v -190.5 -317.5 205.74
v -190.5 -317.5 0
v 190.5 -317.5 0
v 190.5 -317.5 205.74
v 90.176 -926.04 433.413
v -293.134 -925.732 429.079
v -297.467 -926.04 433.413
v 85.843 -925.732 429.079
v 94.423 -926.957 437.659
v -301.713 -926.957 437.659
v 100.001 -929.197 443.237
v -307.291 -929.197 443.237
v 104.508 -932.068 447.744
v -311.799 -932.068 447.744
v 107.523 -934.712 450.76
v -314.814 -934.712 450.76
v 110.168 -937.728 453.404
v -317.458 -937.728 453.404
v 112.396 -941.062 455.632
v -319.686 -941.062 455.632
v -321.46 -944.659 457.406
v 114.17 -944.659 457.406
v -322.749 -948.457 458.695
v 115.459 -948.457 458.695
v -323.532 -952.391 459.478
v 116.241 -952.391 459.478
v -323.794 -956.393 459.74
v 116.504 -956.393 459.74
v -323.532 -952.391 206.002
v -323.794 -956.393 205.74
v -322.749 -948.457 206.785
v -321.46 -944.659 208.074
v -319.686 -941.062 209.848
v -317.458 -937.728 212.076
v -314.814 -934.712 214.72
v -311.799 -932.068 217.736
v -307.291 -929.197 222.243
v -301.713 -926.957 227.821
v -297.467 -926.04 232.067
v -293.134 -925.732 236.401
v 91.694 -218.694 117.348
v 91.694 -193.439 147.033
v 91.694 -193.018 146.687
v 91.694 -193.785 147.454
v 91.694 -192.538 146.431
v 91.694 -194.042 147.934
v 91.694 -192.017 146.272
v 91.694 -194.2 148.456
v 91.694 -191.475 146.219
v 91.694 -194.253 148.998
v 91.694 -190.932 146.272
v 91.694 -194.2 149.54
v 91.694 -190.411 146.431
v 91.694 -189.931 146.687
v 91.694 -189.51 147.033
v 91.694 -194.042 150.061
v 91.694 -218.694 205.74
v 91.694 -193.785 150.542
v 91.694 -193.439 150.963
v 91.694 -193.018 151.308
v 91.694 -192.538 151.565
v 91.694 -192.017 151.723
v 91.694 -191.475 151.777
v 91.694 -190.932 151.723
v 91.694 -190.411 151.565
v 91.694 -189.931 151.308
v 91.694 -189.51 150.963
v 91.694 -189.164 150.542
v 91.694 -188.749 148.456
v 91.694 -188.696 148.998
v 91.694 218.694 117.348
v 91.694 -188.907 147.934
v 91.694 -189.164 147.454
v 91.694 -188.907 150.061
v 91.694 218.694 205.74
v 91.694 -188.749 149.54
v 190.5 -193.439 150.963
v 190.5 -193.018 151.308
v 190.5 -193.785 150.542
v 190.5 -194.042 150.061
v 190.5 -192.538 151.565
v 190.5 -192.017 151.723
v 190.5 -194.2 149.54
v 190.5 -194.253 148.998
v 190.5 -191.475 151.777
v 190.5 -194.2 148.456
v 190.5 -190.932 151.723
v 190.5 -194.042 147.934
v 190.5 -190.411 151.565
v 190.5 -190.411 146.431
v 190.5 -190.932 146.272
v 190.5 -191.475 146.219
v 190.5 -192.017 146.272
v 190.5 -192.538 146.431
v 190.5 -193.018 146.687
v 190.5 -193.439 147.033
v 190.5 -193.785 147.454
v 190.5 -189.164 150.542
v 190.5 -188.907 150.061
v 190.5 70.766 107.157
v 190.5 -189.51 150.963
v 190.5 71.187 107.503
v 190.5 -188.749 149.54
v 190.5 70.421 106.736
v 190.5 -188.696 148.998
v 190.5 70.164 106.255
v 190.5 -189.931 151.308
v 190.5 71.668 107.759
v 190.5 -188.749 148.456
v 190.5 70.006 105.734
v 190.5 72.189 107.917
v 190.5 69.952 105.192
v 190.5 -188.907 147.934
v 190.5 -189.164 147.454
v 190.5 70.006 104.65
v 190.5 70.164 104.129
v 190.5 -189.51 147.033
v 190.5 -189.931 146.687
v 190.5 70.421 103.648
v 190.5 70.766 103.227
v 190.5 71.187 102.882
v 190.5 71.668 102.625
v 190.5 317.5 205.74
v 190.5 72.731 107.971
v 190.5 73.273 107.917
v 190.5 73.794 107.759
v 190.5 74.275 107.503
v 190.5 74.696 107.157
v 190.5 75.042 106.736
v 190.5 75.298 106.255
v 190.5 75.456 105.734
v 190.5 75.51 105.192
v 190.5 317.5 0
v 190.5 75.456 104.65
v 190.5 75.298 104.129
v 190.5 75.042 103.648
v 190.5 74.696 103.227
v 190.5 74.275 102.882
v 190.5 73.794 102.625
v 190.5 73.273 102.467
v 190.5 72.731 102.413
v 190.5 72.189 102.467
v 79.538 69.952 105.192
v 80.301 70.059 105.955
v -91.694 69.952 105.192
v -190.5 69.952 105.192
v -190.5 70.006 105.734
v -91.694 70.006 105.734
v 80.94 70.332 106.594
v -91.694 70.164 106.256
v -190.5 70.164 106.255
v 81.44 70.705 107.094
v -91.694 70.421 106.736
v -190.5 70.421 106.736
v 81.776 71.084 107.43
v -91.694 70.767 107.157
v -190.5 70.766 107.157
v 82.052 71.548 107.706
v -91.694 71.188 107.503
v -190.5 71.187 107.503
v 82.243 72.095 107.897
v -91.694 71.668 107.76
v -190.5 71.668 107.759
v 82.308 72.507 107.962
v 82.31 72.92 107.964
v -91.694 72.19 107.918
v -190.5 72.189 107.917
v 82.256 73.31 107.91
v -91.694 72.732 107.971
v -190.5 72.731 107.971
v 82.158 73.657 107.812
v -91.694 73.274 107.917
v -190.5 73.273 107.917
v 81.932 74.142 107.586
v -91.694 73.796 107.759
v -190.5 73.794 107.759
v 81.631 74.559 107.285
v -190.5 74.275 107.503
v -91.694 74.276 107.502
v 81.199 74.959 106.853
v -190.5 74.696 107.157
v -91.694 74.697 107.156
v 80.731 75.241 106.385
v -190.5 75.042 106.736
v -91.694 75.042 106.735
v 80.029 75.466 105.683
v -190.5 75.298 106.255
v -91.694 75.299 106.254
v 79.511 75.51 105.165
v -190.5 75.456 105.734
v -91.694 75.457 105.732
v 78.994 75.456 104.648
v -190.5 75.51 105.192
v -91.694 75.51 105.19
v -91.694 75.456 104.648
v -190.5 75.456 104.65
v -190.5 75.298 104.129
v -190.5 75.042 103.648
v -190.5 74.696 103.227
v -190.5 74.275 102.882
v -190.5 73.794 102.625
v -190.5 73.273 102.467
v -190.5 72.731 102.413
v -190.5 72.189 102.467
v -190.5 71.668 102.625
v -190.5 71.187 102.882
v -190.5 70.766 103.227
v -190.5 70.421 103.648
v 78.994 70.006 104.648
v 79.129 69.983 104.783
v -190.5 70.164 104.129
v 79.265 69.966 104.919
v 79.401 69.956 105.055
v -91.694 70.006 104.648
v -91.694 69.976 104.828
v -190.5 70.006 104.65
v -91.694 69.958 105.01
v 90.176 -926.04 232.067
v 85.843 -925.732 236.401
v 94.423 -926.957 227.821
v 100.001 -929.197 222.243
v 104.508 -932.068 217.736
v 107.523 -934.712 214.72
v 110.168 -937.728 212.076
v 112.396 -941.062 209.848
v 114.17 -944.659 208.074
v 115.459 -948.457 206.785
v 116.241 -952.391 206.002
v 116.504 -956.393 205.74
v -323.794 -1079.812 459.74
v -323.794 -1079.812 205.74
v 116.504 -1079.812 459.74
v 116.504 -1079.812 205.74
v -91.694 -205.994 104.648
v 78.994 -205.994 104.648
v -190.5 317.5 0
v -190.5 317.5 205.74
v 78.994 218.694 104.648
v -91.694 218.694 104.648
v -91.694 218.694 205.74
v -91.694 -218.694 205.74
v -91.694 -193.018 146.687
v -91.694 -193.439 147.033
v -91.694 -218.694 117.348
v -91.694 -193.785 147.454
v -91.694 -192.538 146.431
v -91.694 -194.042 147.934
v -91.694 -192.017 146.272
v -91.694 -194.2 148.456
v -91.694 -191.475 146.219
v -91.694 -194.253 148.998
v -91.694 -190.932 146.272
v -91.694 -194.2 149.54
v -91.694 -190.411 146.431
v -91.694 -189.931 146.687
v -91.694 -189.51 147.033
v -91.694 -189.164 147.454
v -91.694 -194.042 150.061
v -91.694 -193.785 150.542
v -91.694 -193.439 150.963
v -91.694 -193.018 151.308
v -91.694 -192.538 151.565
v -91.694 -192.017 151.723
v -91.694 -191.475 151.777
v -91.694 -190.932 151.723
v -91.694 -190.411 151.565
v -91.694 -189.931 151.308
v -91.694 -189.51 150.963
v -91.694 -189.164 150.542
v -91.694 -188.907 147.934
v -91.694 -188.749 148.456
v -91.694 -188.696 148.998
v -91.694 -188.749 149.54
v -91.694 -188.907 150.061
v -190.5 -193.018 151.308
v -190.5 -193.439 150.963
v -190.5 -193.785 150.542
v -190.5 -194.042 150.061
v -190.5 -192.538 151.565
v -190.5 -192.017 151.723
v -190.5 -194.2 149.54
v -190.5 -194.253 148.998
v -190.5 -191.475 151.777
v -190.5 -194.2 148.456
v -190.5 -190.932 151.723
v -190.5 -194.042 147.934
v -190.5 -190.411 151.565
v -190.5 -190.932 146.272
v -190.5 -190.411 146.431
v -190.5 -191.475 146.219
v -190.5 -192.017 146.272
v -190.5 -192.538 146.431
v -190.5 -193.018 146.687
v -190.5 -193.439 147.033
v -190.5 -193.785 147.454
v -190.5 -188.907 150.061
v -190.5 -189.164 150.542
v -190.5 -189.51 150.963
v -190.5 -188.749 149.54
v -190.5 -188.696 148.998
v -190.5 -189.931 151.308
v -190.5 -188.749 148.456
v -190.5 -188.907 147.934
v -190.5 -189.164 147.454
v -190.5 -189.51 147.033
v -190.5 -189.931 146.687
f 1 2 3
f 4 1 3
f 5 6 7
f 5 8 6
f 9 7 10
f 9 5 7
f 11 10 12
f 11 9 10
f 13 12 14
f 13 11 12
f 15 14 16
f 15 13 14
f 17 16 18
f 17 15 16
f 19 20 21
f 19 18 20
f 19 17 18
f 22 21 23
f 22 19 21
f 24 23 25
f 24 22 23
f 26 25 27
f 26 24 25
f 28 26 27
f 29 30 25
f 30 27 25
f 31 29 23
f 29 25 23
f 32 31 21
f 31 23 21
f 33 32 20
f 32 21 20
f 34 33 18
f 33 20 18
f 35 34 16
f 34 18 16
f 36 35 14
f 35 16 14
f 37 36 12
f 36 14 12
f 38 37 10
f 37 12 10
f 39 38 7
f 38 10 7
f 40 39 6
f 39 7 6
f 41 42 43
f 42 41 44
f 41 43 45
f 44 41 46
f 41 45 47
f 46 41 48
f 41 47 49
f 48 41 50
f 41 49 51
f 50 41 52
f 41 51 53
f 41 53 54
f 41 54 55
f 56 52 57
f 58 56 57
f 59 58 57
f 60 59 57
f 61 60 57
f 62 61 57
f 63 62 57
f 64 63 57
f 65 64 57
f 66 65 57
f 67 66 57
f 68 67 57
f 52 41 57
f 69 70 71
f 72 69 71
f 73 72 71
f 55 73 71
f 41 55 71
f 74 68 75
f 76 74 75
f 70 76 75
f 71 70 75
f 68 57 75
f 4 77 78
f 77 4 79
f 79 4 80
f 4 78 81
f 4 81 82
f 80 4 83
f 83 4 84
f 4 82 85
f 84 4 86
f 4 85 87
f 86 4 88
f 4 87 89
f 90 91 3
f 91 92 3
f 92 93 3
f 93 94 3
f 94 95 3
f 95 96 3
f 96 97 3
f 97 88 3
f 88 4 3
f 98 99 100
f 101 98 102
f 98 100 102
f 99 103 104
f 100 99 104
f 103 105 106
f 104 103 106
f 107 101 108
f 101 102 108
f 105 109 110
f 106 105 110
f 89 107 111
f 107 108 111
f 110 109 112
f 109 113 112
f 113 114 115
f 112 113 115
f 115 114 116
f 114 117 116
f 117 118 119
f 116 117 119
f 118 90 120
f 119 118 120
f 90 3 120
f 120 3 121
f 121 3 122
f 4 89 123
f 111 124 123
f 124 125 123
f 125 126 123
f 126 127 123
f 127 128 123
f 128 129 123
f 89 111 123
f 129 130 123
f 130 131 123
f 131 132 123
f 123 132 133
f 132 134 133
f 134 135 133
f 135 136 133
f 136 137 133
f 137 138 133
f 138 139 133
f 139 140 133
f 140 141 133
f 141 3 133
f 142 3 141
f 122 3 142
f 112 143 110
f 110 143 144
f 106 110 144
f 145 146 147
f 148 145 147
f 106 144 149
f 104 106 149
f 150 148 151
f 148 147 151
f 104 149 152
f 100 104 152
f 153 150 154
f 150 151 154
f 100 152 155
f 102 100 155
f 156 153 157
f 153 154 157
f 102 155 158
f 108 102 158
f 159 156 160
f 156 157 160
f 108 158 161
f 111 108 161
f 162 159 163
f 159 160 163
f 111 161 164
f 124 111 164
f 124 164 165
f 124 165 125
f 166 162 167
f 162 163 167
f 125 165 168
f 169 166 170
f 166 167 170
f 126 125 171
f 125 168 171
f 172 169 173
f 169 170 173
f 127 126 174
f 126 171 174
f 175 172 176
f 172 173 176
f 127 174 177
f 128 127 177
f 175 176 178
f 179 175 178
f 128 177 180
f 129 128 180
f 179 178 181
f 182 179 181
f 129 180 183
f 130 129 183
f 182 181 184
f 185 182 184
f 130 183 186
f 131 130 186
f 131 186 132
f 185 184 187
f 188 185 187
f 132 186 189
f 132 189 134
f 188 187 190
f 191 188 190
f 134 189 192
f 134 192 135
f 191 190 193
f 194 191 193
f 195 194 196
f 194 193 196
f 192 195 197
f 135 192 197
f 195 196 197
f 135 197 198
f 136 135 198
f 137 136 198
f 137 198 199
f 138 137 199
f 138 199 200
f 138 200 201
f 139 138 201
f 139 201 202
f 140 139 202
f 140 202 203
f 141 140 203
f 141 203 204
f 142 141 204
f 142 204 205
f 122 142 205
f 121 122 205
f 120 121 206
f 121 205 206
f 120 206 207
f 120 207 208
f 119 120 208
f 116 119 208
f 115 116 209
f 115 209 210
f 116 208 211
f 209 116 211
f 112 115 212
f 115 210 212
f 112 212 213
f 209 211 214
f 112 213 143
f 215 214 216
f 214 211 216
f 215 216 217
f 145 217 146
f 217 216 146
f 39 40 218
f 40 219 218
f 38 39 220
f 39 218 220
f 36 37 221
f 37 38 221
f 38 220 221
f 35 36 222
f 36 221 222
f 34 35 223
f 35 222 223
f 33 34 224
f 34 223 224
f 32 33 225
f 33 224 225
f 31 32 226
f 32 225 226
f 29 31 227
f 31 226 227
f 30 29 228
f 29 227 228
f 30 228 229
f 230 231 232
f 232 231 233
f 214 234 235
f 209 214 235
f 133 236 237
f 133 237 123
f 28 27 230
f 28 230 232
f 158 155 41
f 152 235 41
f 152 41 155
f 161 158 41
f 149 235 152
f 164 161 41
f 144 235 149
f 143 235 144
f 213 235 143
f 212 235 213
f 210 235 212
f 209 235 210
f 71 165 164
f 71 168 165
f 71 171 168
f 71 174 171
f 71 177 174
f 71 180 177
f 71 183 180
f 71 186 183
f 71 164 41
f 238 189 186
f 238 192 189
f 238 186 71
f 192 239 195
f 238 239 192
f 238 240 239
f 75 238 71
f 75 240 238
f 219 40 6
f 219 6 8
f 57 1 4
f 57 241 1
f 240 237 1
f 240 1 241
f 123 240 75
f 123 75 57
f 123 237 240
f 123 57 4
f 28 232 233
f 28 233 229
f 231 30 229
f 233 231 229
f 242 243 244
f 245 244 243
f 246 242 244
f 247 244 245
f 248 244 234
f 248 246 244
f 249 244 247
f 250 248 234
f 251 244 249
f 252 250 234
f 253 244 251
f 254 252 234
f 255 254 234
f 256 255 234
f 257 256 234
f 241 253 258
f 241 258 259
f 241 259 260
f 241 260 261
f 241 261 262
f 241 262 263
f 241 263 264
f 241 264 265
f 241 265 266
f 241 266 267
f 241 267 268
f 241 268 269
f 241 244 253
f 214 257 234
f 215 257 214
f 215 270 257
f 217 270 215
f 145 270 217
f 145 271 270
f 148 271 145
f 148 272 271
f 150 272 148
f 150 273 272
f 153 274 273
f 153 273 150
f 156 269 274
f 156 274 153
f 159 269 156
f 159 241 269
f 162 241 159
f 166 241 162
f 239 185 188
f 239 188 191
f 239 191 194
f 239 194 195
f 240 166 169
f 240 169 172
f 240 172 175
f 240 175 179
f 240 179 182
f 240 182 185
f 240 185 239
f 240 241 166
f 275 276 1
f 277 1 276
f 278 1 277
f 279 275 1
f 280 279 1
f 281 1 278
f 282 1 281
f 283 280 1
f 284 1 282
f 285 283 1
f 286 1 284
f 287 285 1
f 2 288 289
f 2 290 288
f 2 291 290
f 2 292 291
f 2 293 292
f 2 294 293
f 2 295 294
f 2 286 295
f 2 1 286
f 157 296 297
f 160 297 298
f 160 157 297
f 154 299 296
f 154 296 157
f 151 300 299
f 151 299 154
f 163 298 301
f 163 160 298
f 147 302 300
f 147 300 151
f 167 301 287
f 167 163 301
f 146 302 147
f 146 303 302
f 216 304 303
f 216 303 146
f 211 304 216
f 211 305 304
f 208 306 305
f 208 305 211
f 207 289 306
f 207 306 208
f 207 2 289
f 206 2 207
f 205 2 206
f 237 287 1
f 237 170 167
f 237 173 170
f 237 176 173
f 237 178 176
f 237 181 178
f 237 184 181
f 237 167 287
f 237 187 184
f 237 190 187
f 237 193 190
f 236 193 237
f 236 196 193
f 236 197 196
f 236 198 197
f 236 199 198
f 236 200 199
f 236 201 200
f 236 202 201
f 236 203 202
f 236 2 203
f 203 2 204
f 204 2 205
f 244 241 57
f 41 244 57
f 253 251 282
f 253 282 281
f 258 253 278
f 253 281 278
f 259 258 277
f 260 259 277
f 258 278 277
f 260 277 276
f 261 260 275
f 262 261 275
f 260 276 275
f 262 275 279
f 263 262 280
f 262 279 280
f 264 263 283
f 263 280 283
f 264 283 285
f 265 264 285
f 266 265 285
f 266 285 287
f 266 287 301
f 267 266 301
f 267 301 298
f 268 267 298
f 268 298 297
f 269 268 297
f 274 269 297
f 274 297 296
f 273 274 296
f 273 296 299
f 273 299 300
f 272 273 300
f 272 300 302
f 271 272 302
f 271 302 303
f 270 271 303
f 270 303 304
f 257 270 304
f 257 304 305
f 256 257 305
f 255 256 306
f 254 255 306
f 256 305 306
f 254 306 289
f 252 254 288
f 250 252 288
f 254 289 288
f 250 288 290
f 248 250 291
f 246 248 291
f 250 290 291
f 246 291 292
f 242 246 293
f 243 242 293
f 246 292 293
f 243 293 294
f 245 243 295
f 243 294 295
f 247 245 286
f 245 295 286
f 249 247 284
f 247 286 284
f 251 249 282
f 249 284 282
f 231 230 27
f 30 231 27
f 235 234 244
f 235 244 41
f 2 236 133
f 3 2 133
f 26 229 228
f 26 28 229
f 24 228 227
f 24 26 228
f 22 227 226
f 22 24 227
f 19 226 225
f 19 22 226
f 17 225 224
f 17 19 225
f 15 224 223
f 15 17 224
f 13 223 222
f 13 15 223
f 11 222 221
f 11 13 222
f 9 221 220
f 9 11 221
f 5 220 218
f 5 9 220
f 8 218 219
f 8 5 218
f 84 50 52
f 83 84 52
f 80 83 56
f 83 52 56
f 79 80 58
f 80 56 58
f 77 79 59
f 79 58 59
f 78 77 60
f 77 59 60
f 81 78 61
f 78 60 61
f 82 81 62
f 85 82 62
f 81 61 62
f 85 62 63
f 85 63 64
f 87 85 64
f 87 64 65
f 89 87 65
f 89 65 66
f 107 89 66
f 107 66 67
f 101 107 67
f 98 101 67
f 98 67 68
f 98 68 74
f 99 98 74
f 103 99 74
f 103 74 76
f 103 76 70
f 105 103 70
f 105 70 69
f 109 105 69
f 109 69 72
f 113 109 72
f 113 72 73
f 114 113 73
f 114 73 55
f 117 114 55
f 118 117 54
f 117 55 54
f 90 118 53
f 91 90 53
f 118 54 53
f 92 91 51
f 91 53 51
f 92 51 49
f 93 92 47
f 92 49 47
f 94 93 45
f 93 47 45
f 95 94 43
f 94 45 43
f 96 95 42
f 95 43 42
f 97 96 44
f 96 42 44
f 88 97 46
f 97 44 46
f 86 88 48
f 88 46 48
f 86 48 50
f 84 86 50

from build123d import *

# Parameters (mm, degrees)
F0_W     = 381
F0_H     = 635
F1_DEPTH = 205.74
F2_W     = 183.3879947662
F2_H     = 437.3879947662
F3_DEPTH = 101.092
F4_W     = 440.2977898717
F4_H     = 154.080092907
F5_DEPTH = 254
F6_R     = 30.6605122421
F7_SIZE  = 12.7
F9_D     = 5.55752


with BuildPart() as f1:
    # F0 (on Top) → F1 (new body)
    with BuildSketch(Plane.XY):
        Rectangle(F0_W, F0_H)
    extrude(amount=F1_DEPTH)

    # F2 (on face) → F3 (cut)
    with BuildSketch(Plane.XY.offset(205.74)):
        Rectangle(F2_W, F2_H)
    extrude(amount=-F3_DEPTH, mode=Mode.SUBTRACT)

    # F7
    f7_edges = [f1.edges().sort_by_distance(p)[0] for p in [
        (0, -218.693997, 104.648),
        (91.693997, 0, 104.648),
    ]]
    chamfer(f7_edges, length=F7_SIZE)

    # F9 (through all)
    with Locations(Plane.YZ.offset(190.5)):
        with Locations((-191.4745569229, 148.9978134632), (72.7311000228, 105.1920801401)):
            Hole(F9_D / 2)


with BuildPart() as f5:
    # F4 (on face) → F5 (new body)
    with BuildSketch(Plane.XY.offset(205.74)):
        with Locations((-103.6452613771, -1002.7722418308)):
            Rectangle(F4_W, F4_H)
    extrude(amount=F5_DEPTH)

    # F6
    f6_edges = [f5.edges().sort_by_distance(p)[0] for p in [
        (116.503634, -925.732195, 332.74),
        (-323.794156, -925.732195, 332.74),
        (-103.645261, -925.732195, 205.74),
        (-103.645261, -925.732195, 459.74),
    ]]
    fillet(f6_edges, radius=F6_R)


solid = Compound([f1.part, f5.part])
